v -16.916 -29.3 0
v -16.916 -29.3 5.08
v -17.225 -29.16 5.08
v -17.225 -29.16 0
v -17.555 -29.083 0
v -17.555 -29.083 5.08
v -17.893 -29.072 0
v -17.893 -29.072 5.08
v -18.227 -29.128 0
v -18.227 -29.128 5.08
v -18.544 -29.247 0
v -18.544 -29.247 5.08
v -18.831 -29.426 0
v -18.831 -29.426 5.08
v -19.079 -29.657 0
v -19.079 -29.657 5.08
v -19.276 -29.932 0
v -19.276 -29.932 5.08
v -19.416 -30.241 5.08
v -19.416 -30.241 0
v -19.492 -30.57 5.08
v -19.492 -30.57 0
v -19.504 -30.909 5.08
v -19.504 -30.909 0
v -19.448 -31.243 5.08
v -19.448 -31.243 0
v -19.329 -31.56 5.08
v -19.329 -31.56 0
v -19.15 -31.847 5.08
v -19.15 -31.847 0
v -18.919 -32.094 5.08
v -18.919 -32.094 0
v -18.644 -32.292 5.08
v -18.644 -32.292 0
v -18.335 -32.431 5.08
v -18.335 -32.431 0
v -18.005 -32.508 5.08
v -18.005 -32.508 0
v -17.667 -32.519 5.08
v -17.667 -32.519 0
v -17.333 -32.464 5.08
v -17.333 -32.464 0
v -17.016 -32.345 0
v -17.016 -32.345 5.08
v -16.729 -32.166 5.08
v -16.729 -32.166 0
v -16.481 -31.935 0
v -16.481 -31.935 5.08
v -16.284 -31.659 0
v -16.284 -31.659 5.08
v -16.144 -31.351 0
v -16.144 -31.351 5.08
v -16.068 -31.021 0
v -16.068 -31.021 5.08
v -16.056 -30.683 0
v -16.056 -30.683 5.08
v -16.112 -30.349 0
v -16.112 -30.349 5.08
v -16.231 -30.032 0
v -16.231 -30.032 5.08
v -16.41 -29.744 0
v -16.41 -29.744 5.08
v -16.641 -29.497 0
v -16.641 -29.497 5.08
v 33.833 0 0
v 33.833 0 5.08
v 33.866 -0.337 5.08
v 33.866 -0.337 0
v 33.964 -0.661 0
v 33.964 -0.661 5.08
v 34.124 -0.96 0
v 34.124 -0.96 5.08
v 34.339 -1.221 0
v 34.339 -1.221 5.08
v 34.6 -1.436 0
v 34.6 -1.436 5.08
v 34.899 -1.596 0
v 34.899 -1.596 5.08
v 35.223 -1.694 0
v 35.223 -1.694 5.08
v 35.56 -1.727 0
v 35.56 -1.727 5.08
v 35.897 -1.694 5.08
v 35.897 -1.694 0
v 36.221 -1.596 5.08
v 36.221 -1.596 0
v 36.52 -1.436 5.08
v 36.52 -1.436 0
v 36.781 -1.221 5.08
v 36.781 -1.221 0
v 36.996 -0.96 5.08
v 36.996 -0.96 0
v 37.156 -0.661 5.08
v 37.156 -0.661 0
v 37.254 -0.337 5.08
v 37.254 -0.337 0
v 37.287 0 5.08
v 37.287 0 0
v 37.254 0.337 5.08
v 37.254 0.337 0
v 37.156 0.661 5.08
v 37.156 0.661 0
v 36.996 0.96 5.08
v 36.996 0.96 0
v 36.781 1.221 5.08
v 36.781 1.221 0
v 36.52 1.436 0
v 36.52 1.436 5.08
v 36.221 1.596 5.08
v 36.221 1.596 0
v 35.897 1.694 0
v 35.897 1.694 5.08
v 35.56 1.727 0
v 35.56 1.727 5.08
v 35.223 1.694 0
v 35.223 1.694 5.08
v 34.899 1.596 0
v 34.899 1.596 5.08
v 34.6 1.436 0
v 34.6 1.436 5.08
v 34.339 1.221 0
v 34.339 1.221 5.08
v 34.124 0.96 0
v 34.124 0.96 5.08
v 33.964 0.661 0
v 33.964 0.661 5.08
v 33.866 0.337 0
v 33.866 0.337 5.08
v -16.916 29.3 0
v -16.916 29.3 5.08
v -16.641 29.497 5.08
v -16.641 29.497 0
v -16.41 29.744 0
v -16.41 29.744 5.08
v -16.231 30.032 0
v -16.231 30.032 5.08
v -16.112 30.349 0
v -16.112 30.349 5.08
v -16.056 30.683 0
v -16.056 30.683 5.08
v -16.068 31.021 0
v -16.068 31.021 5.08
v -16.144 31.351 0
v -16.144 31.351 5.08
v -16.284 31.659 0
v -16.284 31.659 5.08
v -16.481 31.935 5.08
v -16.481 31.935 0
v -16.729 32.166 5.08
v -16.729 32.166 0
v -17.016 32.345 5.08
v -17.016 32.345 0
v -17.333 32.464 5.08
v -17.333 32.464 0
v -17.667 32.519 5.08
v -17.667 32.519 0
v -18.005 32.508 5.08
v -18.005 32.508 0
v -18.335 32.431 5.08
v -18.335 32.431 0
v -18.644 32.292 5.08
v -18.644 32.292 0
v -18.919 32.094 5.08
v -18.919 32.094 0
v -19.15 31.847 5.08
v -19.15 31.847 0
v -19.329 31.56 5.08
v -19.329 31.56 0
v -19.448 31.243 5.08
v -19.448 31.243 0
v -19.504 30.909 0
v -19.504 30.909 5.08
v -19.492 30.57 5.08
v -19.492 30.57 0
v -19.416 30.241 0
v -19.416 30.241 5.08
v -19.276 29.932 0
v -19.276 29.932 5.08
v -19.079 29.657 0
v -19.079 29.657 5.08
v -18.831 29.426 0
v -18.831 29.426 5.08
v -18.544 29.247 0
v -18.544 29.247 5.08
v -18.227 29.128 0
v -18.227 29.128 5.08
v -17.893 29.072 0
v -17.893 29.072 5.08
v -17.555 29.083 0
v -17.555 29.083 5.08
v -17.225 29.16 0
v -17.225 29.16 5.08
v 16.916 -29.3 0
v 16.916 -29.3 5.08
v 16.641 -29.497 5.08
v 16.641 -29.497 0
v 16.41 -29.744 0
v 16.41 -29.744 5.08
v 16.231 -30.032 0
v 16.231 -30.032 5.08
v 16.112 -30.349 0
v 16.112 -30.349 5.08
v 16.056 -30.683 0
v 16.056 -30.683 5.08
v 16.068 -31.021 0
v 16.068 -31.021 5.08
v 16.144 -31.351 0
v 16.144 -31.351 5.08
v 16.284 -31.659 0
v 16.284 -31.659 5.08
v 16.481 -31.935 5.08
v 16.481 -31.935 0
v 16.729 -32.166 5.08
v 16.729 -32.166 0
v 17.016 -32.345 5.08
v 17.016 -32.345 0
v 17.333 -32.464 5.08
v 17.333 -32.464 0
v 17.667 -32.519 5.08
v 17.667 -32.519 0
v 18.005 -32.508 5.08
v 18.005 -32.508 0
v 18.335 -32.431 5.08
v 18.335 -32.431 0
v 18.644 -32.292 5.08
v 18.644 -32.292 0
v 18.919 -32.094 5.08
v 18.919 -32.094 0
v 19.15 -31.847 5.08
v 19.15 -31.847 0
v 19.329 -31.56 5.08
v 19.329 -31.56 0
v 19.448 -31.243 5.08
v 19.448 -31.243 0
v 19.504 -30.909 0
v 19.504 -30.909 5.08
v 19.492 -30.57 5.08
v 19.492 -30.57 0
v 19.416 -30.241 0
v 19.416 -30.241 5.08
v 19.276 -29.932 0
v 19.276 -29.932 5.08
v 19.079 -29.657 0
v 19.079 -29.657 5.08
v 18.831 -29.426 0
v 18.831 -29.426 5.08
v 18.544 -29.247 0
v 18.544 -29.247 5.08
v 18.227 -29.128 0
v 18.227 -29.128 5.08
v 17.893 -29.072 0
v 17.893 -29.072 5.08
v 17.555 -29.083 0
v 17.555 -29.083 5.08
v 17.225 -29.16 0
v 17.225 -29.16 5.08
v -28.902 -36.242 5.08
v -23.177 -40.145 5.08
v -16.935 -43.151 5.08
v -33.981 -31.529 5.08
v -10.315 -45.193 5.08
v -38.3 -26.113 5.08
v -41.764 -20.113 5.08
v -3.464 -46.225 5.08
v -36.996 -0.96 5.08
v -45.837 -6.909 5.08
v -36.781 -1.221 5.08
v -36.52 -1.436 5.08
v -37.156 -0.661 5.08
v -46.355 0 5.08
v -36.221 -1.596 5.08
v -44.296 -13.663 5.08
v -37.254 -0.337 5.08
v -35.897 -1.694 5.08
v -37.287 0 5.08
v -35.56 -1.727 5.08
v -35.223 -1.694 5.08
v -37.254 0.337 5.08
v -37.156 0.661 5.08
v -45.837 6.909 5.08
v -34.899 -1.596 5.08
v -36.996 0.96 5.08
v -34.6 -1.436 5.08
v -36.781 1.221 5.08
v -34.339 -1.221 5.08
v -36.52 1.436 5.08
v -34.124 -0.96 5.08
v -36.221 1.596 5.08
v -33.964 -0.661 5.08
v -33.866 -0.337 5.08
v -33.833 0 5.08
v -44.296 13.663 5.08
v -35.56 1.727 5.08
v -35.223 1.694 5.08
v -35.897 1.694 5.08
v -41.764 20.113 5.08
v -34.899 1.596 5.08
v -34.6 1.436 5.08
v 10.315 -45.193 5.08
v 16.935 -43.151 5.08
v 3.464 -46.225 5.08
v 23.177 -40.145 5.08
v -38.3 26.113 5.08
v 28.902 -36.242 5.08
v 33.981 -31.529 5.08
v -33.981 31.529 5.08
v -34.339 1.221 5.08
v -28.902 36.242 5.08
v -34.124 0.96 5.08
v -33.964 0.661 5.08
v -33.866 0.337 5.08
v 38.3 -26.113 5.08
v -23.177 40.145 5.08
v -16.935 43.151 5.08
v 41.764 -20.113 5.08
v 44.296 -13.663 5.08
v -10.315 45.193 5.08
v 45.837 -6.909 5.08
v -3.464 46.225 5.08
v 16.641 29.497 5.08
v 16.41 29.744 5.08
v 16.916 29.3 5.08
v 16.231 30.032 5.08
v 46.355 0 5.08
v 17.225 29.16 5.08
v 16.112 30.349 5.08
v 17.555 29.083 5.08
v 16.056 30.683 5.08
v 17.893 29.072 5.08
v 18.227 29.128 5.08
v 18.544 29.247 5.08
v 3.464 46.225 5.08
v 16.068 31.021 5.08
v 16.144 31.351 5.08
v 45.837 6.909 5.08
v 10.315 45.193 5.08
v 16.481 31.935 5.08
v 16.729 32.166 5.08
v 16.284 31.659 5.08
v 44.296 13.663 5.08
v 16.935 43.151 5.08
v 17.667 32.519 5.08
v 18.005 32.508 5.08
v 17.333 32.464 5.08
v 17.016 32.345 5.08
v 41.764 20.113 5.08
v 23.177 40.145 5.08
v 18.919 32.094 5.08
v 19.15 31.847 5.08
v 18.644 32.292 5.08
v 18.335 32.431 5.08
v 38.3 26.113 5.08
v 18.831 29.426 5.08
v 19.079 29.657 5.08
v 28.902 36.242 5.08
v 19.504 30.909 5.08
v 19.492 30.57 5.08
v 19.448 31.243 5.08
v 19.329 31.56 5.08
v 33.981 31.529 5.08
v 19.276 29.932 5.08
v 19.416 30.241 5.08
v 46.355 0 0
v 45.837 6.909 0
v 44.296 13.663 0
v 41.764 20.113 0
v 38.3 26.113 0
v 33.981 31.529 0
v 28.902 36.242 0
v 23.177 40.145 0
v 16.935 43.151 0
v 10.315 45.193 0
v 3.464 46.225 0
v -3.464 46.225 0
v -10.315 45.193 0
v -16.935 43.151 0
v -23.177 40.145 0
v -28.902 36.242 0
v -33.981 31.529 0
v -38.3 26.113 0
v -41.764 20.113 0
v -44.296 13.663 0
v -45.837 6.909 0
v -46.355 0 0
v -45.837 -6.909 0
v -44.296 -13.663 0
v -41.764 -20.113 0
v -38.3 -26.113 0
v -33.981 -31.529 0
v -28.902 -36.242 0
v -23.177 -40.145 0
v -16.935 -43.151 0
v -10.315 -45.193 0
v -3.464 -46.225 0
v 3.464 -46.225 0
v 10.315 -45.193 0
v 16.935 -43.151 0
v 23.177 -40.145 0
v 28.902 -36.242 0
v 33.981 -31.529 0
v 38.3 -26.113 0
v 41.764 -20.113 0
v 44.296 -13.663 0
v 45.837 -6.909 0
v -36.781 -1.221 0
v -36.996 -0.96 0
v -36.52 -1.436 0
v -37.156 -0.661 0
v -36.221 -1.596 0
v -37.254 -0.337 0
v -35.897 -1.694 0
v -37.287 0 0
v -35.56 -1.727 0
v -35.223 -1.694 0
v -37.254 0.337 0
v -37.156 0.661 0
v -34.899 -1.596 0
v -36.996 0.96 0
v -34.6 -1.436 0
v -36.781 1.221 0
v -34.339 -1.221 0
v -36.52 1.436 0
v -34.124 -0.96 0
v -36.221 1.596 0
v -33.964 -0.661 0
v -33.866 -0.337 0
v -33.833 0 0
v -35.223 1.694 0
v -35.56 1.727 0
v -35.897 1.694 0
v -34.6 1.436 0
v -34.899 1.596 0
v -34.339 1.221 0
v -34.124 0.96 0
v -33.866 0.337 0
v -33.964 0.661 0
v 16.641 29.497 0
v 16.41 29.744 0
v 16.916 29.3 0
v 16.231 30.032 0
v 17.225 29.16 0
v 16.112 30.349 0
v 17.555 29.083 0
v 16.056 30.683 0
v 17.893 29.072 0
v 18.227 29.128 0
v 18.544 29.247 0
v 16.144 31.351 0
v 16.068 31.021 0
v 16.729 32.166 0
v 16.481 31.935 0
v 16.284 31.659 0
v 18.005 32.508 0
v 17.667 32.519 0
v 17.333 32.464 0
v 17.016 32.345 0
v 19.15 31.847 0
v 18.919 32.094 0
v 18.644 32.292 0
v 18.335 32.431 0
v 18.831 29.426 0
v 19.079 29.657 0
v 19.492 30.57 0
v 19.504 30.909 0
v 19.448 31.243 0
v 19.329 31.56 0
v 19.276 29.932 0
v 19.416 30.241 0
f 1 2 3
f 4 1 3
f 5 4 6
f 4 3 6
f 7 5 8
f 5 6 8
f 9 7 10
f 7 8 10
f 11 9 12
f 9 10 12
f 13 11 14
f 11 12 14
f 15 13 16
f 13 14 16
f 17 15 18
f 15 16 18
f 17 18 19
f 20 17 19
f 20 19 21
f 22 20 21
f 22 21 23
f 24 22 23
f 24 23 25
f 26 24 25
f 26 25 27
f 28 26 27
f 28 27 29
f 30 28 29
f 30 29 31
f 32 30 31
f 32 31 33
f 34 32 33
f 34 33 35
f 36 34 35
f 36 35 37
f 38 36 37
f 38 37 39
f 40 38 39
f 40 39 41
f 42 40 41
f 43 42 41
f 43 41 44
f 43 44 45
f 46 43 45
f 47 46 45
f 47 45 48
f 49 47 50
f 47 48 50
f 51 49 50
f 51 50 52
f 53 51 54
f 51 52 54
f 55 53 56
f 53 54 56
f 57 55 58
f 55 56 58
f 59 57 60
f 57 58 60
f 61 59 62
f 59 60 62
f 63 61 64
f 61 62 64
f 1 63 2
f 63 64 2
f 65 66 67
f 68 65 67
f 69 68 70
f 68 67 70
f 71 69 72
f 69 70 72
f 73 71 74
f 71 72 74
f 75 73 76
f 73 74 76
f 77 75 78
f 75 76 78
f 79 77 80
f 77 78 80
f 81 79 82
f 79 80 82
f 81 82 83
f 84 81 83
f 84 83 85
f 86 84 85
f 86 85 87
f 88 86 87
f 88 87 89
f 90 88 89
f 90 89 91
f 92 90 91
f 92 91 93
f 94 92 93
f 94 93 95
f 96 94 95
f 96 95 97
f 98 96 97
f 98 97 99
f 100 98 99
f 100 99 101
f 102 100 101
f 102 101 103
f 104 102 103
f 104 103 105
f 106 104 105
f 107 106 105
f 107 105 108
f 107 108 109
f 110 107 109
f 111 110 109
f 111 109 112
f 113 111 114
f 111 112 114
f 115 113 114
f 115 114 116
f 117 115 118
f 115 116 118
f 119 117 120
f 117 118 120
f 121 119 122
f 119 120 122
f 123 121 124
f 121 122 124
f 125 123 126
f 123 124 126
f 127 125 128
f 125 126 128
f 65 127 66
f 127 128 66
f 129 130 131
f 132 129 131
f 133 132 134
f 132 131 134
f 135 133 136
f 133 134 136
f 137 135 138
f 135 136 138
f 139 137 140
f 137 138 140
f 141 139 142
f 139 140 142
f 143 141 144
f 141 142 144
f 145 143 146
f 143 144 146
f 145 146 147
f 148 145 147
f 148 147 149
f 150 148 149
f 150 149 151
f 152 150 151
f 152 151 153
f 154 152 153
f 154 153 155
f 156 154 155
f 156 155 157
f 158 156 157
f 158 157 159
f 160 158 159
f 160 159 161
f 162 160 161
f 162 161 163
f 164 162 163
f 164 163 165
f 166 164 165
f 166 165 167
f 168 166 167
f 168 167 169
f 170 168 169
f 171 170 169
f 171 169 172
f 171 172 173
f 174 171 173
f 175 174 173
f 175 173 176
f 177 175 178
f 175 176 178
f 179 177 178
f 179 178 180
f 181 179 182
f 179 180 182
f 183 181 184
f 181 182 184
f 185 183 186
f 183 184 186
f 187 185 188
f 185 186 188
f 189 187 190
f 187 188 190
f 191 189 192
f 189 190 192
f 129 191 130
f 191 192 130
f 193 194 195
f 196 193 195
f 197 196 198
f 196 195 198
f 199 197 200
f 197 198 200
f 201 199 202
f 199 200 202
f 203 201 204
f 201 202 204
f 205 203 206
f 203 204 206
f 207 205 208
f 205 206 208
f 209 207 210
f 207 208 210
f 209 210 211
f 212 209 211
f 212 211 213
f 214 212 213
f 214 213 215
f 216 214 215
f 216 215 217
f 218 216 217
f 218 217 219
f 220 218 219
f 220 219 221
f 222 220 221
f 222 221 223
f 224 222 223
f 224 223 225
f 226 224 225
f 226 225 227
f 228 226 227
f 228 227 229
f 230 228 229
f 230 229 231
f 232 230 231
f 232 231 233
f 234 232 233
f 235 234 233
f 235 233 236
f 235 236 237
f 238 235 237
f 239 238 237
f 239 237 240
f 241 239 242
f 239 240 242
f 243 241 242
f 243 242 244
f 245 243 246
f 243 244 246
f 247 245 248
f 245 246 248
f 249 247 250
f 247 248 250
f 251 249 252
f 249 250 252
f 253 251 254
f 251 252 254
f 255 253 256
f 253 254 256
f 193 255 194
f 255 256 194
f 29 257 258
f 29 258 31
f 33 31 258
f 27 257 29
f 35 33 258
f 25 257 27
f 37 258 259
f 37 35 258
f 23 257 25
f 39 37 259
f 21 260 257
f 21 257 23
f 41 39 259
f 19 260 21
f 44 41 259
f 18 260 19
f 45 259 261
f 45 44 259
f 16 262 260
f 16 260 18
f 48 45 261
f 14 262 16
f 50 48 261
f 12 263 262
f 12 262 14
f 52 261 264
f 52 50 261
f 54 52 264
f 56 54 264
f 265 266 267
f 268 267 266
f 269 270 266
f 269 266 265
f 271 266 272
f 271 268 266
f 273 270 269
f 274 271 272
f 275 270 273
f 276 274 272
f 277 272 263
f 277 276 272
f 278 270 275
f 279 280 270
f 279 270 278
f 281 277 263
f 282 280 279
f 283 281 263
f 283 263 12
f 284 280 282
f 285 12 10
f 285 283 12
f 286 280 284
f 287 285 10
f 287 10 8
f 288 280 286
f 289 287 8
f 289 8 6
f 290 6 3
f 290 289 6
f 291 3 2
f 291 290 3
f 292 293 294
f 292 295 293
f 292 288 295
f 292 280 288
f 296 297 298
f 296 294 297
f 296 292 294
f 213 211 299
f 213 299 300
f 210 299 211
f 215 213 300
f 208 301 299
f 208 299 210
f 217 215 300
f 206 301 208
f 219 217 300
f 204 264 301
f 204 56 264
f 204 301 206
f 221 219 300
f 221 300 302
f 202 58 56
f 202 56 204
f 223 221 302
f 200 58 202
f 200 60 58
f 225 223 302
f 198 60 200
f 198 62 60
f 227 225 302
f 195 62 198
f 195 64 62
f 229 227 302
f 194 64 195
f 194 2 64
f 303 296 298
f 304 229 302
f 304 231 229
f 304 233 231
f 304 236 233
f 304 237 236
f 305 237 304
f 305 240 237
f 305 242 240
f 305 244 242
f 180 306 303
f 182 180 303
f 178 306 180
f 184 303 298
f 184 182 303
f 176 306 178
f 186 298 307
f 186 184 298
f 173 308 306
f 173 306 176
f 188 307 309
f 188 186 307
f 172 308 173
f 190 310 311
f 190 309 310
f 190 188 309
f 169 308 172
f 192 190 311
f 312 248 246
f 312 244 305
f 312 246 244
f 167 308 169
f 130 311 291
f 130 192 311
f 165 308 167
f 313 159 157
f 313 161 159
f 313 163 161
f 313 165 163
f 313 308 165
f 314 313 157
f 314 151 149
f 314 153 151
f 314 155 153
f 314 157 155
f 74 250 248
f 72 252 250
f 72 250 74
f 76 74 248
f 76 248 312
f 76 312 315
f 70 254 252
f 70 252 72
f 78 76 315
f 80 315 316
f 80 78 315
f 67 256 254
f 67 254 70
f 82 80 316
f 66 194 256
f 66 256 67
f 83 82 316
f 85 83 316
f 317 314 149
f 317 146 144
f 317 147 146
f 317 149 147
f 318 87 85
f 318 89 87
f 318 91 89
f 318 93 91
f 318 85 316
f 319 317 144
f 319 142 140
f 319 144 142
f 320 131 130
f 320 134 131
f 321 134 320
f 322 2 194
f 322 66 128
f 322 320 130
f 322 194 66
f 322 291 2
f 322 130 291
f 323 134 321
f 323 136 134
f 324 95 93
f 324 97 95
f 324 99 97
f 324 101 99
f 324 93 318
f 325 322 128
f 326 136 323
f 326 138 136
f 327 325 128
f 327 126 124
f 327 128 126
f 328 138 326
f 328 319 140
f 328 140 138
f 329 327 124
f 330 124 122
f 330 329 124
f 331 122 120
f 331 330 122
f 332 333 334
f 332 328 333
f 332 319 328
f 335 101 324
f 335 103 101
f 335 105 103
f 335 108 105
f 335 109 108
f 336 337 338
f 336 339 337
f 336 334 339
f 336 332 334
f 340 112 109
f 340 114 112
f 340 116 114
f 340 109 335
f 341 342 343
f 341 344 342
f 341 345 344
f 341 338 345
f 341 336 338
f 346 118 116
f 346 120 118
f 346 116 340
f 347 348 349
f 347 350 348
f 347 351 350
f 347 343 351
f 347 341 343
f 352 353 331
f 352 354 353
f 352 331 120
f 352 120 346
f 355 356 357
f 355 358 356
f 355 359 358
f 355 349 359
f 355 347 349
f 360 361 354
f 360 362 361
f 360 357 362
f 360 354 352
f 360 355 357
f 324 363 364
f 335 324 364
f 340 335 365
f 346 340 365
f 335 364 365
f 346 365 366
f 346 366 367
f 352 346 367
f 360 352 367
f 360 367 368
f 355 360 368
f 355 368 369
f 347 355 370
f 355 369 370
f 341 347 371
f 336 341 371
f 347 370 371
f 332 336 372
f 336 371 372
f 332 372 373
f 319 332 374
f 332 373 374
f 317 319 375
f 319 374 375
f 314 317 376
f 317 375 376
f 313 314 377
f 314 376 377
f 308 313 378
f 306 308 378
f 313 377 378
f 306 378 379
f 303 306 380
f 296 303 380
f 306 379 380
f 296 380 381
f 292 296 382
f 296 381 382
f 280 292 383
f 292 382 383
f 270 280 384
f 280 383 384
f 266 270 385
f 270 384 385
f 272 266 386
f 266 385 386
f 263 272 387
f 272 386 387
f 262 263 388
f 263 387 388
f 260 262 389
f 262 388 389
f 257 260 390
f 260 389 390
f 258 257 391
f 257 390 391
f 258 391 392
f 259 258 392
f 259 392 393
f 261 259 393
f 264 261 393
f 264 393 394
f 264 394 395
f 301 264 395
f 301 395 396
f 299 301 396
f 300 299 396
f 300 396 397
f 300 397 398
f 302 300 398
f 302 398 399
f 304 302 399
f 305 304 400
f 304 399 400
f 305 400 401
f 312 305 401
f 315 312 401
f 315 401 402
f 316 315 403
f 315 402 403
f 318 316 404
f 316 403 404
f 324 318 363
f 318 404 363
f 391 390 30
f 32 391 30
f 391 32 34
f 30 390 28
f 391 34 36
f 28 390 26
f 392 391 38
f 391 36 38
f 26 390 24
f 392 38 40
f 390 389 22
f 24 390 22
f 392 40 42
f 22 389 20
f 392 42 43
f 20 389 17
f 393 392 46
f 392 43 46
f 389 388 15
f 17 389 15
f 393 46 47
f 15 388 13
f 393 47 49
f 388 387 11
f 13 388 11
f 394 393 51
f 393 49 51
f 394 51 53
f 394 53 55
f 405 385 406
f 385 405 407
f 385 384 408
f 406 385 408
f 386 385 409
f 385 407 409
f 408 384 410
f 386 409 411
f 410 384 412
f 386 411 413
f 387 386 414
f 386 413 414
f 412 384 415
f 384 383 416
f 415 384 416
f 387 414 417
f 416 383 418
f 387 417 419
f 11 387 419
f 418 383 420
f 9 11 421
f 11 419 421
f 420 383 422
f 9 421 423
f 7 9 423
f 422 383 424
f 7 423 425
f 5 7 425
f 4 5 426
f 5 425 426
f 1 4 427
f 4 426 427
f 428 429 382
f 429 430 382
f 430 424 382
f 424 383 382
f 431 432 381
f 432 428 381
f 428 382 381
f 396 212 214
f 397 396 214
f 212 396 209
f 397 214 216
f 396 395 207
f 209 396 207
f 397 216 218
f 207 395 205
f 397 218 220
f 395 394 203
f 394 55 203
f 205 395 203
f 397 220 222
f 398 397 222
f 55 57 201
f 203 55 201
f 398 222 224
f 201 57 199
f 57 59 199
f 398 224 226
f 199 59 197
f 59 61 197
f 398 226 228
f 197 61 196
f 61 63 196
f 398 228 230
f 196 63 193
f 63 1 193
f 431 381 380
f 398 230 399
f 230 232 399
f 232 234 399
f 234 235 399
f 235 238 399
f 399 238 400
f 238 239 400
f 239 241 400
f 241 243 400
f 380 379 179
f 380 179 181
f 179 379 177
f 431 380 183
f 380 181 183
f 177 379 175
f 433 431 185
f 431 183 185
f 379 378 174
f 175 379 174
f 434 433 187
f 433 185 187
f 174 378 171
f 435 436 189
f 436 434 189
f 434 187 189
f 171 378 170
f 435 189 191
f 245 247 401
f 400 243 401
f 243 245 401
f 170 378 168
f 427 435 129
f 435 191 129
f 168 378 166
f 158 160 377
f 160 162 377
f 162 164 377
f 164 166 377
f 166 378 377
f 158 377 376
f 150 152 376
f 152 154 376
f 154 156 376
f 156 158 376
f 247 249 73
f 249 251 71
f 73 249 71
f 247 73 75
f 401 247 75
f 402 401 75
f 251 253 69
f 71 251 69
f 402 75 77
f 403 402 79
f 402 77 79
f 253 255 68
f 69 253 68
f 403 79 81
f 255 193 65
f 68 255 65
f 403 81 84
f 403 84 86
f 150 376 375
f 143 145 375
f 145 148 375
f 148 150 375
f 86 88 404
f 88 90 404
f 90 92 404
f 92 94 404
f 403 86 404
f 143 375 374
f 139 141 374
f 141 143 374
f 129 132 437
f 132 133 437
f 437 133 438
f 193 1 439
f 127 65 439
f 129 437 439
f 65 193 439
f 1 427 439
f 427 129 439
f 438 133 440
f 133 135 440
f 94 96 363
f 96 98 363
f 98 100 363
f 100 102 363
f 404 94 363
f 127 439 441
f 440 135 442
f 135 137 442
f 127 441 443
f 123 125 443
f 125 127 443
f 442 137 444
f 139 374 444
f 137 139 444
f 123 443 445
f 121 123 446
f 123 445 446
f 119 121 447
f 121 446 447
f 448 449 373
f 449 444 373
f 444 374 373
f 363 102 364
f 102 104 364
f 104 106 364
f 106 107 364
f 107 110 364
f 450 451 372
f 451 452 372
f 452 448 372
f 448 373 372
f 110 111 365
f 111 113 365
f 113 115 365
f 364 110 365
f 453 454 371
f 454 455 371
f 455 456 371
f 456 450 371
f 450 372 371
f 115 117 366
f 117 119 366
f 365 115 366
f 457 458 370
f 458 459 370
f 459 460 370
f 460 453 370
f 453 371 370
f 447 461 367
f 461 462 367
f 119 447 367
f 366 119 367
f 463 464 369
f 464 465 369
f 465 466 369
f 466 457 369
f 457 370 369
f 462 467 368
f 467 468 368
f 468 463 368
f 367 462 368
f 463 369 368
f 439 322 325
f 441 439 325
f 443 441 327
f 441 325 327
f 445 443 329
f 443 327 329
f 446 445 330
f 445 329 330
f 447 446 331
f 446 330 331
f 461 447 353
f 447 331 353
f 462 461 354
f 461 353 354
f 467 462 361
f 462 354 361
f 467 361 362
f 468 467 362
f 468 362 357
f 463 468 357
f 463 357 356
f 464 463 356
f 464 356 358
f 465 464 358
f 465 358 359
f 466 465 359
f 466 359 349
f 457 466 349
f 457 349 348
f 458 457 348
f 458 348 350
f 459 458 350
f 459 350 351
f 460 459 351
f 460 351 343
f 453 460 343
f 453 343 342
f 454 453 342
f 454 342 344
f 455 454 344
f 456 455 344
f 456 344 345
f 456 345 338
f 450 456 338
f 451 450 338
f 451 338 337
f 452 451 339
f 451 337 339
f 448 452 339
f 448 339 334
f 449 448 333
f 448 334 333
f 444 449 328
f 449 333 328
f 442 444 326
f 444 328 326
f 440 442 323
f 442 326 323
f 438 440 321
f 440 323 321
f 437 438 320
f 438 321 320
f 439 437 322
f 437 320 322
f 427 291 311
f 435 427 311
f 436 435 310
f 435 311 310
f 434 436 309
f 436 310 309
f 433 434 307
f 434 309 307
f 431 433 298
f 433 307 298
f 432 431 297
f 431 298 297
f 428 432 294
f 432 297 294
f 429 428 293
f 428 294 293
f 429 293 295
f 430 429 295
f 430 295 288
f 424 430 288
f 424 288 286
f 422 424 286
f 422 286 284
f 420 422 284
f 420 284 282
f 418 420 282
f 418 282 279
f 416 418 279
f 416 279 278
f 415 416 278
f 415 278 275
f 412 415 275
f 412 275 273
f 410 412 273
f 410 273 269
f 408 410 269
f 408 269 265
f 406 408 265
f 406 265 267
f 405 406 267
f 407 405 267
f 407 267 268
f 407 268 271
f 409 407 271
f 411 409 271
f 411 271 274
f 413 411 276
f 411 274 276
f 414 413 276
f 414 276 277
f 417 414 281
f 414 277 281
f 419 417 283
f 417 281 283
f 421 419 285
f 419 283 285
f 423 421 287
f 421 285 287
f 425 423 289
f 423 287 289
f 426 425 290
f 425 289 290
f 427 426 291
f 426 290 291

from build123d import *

# Parameters (mm, degrees)
F0_R            = 46.355
F1_DEPTH        = 5.08
F4_D            = 3.4544
F4_COPIES_COUNT = 6


# Not quite as in the source:
# - a pattern or mirror of a feature is missing from the dataset's text; its kind, count and spacing are read off the source's solid


with BuildPart() as f1:
    # F0 (on Top) → F1 (new body)
    with BuildSketch(Plane.XY):
        Circle(F0_R)
    extrude(amount=F1_DEPTH)

    # F4 (through all)
    with Locations(Plane(origin=(0, 0, 0), x_dir=(1, 0, 0), z_dir=(0, 0, -1))):
        with Locations((35.56, 0)):
            f4 = Hole(F4_D / 2)

    # F4_copies: F4 ×6 about axis
    f4_copies_axis = Axis((0, 0, 0), (0, 0, 1))
    for i in range(1, F4_COPIES_COUNT):
        add(f4.rotate(f4_copies_axis, i * 360 / F4_COPIES_COUNT), mode=Mode.SUBTRACT)


solid = f1.part
